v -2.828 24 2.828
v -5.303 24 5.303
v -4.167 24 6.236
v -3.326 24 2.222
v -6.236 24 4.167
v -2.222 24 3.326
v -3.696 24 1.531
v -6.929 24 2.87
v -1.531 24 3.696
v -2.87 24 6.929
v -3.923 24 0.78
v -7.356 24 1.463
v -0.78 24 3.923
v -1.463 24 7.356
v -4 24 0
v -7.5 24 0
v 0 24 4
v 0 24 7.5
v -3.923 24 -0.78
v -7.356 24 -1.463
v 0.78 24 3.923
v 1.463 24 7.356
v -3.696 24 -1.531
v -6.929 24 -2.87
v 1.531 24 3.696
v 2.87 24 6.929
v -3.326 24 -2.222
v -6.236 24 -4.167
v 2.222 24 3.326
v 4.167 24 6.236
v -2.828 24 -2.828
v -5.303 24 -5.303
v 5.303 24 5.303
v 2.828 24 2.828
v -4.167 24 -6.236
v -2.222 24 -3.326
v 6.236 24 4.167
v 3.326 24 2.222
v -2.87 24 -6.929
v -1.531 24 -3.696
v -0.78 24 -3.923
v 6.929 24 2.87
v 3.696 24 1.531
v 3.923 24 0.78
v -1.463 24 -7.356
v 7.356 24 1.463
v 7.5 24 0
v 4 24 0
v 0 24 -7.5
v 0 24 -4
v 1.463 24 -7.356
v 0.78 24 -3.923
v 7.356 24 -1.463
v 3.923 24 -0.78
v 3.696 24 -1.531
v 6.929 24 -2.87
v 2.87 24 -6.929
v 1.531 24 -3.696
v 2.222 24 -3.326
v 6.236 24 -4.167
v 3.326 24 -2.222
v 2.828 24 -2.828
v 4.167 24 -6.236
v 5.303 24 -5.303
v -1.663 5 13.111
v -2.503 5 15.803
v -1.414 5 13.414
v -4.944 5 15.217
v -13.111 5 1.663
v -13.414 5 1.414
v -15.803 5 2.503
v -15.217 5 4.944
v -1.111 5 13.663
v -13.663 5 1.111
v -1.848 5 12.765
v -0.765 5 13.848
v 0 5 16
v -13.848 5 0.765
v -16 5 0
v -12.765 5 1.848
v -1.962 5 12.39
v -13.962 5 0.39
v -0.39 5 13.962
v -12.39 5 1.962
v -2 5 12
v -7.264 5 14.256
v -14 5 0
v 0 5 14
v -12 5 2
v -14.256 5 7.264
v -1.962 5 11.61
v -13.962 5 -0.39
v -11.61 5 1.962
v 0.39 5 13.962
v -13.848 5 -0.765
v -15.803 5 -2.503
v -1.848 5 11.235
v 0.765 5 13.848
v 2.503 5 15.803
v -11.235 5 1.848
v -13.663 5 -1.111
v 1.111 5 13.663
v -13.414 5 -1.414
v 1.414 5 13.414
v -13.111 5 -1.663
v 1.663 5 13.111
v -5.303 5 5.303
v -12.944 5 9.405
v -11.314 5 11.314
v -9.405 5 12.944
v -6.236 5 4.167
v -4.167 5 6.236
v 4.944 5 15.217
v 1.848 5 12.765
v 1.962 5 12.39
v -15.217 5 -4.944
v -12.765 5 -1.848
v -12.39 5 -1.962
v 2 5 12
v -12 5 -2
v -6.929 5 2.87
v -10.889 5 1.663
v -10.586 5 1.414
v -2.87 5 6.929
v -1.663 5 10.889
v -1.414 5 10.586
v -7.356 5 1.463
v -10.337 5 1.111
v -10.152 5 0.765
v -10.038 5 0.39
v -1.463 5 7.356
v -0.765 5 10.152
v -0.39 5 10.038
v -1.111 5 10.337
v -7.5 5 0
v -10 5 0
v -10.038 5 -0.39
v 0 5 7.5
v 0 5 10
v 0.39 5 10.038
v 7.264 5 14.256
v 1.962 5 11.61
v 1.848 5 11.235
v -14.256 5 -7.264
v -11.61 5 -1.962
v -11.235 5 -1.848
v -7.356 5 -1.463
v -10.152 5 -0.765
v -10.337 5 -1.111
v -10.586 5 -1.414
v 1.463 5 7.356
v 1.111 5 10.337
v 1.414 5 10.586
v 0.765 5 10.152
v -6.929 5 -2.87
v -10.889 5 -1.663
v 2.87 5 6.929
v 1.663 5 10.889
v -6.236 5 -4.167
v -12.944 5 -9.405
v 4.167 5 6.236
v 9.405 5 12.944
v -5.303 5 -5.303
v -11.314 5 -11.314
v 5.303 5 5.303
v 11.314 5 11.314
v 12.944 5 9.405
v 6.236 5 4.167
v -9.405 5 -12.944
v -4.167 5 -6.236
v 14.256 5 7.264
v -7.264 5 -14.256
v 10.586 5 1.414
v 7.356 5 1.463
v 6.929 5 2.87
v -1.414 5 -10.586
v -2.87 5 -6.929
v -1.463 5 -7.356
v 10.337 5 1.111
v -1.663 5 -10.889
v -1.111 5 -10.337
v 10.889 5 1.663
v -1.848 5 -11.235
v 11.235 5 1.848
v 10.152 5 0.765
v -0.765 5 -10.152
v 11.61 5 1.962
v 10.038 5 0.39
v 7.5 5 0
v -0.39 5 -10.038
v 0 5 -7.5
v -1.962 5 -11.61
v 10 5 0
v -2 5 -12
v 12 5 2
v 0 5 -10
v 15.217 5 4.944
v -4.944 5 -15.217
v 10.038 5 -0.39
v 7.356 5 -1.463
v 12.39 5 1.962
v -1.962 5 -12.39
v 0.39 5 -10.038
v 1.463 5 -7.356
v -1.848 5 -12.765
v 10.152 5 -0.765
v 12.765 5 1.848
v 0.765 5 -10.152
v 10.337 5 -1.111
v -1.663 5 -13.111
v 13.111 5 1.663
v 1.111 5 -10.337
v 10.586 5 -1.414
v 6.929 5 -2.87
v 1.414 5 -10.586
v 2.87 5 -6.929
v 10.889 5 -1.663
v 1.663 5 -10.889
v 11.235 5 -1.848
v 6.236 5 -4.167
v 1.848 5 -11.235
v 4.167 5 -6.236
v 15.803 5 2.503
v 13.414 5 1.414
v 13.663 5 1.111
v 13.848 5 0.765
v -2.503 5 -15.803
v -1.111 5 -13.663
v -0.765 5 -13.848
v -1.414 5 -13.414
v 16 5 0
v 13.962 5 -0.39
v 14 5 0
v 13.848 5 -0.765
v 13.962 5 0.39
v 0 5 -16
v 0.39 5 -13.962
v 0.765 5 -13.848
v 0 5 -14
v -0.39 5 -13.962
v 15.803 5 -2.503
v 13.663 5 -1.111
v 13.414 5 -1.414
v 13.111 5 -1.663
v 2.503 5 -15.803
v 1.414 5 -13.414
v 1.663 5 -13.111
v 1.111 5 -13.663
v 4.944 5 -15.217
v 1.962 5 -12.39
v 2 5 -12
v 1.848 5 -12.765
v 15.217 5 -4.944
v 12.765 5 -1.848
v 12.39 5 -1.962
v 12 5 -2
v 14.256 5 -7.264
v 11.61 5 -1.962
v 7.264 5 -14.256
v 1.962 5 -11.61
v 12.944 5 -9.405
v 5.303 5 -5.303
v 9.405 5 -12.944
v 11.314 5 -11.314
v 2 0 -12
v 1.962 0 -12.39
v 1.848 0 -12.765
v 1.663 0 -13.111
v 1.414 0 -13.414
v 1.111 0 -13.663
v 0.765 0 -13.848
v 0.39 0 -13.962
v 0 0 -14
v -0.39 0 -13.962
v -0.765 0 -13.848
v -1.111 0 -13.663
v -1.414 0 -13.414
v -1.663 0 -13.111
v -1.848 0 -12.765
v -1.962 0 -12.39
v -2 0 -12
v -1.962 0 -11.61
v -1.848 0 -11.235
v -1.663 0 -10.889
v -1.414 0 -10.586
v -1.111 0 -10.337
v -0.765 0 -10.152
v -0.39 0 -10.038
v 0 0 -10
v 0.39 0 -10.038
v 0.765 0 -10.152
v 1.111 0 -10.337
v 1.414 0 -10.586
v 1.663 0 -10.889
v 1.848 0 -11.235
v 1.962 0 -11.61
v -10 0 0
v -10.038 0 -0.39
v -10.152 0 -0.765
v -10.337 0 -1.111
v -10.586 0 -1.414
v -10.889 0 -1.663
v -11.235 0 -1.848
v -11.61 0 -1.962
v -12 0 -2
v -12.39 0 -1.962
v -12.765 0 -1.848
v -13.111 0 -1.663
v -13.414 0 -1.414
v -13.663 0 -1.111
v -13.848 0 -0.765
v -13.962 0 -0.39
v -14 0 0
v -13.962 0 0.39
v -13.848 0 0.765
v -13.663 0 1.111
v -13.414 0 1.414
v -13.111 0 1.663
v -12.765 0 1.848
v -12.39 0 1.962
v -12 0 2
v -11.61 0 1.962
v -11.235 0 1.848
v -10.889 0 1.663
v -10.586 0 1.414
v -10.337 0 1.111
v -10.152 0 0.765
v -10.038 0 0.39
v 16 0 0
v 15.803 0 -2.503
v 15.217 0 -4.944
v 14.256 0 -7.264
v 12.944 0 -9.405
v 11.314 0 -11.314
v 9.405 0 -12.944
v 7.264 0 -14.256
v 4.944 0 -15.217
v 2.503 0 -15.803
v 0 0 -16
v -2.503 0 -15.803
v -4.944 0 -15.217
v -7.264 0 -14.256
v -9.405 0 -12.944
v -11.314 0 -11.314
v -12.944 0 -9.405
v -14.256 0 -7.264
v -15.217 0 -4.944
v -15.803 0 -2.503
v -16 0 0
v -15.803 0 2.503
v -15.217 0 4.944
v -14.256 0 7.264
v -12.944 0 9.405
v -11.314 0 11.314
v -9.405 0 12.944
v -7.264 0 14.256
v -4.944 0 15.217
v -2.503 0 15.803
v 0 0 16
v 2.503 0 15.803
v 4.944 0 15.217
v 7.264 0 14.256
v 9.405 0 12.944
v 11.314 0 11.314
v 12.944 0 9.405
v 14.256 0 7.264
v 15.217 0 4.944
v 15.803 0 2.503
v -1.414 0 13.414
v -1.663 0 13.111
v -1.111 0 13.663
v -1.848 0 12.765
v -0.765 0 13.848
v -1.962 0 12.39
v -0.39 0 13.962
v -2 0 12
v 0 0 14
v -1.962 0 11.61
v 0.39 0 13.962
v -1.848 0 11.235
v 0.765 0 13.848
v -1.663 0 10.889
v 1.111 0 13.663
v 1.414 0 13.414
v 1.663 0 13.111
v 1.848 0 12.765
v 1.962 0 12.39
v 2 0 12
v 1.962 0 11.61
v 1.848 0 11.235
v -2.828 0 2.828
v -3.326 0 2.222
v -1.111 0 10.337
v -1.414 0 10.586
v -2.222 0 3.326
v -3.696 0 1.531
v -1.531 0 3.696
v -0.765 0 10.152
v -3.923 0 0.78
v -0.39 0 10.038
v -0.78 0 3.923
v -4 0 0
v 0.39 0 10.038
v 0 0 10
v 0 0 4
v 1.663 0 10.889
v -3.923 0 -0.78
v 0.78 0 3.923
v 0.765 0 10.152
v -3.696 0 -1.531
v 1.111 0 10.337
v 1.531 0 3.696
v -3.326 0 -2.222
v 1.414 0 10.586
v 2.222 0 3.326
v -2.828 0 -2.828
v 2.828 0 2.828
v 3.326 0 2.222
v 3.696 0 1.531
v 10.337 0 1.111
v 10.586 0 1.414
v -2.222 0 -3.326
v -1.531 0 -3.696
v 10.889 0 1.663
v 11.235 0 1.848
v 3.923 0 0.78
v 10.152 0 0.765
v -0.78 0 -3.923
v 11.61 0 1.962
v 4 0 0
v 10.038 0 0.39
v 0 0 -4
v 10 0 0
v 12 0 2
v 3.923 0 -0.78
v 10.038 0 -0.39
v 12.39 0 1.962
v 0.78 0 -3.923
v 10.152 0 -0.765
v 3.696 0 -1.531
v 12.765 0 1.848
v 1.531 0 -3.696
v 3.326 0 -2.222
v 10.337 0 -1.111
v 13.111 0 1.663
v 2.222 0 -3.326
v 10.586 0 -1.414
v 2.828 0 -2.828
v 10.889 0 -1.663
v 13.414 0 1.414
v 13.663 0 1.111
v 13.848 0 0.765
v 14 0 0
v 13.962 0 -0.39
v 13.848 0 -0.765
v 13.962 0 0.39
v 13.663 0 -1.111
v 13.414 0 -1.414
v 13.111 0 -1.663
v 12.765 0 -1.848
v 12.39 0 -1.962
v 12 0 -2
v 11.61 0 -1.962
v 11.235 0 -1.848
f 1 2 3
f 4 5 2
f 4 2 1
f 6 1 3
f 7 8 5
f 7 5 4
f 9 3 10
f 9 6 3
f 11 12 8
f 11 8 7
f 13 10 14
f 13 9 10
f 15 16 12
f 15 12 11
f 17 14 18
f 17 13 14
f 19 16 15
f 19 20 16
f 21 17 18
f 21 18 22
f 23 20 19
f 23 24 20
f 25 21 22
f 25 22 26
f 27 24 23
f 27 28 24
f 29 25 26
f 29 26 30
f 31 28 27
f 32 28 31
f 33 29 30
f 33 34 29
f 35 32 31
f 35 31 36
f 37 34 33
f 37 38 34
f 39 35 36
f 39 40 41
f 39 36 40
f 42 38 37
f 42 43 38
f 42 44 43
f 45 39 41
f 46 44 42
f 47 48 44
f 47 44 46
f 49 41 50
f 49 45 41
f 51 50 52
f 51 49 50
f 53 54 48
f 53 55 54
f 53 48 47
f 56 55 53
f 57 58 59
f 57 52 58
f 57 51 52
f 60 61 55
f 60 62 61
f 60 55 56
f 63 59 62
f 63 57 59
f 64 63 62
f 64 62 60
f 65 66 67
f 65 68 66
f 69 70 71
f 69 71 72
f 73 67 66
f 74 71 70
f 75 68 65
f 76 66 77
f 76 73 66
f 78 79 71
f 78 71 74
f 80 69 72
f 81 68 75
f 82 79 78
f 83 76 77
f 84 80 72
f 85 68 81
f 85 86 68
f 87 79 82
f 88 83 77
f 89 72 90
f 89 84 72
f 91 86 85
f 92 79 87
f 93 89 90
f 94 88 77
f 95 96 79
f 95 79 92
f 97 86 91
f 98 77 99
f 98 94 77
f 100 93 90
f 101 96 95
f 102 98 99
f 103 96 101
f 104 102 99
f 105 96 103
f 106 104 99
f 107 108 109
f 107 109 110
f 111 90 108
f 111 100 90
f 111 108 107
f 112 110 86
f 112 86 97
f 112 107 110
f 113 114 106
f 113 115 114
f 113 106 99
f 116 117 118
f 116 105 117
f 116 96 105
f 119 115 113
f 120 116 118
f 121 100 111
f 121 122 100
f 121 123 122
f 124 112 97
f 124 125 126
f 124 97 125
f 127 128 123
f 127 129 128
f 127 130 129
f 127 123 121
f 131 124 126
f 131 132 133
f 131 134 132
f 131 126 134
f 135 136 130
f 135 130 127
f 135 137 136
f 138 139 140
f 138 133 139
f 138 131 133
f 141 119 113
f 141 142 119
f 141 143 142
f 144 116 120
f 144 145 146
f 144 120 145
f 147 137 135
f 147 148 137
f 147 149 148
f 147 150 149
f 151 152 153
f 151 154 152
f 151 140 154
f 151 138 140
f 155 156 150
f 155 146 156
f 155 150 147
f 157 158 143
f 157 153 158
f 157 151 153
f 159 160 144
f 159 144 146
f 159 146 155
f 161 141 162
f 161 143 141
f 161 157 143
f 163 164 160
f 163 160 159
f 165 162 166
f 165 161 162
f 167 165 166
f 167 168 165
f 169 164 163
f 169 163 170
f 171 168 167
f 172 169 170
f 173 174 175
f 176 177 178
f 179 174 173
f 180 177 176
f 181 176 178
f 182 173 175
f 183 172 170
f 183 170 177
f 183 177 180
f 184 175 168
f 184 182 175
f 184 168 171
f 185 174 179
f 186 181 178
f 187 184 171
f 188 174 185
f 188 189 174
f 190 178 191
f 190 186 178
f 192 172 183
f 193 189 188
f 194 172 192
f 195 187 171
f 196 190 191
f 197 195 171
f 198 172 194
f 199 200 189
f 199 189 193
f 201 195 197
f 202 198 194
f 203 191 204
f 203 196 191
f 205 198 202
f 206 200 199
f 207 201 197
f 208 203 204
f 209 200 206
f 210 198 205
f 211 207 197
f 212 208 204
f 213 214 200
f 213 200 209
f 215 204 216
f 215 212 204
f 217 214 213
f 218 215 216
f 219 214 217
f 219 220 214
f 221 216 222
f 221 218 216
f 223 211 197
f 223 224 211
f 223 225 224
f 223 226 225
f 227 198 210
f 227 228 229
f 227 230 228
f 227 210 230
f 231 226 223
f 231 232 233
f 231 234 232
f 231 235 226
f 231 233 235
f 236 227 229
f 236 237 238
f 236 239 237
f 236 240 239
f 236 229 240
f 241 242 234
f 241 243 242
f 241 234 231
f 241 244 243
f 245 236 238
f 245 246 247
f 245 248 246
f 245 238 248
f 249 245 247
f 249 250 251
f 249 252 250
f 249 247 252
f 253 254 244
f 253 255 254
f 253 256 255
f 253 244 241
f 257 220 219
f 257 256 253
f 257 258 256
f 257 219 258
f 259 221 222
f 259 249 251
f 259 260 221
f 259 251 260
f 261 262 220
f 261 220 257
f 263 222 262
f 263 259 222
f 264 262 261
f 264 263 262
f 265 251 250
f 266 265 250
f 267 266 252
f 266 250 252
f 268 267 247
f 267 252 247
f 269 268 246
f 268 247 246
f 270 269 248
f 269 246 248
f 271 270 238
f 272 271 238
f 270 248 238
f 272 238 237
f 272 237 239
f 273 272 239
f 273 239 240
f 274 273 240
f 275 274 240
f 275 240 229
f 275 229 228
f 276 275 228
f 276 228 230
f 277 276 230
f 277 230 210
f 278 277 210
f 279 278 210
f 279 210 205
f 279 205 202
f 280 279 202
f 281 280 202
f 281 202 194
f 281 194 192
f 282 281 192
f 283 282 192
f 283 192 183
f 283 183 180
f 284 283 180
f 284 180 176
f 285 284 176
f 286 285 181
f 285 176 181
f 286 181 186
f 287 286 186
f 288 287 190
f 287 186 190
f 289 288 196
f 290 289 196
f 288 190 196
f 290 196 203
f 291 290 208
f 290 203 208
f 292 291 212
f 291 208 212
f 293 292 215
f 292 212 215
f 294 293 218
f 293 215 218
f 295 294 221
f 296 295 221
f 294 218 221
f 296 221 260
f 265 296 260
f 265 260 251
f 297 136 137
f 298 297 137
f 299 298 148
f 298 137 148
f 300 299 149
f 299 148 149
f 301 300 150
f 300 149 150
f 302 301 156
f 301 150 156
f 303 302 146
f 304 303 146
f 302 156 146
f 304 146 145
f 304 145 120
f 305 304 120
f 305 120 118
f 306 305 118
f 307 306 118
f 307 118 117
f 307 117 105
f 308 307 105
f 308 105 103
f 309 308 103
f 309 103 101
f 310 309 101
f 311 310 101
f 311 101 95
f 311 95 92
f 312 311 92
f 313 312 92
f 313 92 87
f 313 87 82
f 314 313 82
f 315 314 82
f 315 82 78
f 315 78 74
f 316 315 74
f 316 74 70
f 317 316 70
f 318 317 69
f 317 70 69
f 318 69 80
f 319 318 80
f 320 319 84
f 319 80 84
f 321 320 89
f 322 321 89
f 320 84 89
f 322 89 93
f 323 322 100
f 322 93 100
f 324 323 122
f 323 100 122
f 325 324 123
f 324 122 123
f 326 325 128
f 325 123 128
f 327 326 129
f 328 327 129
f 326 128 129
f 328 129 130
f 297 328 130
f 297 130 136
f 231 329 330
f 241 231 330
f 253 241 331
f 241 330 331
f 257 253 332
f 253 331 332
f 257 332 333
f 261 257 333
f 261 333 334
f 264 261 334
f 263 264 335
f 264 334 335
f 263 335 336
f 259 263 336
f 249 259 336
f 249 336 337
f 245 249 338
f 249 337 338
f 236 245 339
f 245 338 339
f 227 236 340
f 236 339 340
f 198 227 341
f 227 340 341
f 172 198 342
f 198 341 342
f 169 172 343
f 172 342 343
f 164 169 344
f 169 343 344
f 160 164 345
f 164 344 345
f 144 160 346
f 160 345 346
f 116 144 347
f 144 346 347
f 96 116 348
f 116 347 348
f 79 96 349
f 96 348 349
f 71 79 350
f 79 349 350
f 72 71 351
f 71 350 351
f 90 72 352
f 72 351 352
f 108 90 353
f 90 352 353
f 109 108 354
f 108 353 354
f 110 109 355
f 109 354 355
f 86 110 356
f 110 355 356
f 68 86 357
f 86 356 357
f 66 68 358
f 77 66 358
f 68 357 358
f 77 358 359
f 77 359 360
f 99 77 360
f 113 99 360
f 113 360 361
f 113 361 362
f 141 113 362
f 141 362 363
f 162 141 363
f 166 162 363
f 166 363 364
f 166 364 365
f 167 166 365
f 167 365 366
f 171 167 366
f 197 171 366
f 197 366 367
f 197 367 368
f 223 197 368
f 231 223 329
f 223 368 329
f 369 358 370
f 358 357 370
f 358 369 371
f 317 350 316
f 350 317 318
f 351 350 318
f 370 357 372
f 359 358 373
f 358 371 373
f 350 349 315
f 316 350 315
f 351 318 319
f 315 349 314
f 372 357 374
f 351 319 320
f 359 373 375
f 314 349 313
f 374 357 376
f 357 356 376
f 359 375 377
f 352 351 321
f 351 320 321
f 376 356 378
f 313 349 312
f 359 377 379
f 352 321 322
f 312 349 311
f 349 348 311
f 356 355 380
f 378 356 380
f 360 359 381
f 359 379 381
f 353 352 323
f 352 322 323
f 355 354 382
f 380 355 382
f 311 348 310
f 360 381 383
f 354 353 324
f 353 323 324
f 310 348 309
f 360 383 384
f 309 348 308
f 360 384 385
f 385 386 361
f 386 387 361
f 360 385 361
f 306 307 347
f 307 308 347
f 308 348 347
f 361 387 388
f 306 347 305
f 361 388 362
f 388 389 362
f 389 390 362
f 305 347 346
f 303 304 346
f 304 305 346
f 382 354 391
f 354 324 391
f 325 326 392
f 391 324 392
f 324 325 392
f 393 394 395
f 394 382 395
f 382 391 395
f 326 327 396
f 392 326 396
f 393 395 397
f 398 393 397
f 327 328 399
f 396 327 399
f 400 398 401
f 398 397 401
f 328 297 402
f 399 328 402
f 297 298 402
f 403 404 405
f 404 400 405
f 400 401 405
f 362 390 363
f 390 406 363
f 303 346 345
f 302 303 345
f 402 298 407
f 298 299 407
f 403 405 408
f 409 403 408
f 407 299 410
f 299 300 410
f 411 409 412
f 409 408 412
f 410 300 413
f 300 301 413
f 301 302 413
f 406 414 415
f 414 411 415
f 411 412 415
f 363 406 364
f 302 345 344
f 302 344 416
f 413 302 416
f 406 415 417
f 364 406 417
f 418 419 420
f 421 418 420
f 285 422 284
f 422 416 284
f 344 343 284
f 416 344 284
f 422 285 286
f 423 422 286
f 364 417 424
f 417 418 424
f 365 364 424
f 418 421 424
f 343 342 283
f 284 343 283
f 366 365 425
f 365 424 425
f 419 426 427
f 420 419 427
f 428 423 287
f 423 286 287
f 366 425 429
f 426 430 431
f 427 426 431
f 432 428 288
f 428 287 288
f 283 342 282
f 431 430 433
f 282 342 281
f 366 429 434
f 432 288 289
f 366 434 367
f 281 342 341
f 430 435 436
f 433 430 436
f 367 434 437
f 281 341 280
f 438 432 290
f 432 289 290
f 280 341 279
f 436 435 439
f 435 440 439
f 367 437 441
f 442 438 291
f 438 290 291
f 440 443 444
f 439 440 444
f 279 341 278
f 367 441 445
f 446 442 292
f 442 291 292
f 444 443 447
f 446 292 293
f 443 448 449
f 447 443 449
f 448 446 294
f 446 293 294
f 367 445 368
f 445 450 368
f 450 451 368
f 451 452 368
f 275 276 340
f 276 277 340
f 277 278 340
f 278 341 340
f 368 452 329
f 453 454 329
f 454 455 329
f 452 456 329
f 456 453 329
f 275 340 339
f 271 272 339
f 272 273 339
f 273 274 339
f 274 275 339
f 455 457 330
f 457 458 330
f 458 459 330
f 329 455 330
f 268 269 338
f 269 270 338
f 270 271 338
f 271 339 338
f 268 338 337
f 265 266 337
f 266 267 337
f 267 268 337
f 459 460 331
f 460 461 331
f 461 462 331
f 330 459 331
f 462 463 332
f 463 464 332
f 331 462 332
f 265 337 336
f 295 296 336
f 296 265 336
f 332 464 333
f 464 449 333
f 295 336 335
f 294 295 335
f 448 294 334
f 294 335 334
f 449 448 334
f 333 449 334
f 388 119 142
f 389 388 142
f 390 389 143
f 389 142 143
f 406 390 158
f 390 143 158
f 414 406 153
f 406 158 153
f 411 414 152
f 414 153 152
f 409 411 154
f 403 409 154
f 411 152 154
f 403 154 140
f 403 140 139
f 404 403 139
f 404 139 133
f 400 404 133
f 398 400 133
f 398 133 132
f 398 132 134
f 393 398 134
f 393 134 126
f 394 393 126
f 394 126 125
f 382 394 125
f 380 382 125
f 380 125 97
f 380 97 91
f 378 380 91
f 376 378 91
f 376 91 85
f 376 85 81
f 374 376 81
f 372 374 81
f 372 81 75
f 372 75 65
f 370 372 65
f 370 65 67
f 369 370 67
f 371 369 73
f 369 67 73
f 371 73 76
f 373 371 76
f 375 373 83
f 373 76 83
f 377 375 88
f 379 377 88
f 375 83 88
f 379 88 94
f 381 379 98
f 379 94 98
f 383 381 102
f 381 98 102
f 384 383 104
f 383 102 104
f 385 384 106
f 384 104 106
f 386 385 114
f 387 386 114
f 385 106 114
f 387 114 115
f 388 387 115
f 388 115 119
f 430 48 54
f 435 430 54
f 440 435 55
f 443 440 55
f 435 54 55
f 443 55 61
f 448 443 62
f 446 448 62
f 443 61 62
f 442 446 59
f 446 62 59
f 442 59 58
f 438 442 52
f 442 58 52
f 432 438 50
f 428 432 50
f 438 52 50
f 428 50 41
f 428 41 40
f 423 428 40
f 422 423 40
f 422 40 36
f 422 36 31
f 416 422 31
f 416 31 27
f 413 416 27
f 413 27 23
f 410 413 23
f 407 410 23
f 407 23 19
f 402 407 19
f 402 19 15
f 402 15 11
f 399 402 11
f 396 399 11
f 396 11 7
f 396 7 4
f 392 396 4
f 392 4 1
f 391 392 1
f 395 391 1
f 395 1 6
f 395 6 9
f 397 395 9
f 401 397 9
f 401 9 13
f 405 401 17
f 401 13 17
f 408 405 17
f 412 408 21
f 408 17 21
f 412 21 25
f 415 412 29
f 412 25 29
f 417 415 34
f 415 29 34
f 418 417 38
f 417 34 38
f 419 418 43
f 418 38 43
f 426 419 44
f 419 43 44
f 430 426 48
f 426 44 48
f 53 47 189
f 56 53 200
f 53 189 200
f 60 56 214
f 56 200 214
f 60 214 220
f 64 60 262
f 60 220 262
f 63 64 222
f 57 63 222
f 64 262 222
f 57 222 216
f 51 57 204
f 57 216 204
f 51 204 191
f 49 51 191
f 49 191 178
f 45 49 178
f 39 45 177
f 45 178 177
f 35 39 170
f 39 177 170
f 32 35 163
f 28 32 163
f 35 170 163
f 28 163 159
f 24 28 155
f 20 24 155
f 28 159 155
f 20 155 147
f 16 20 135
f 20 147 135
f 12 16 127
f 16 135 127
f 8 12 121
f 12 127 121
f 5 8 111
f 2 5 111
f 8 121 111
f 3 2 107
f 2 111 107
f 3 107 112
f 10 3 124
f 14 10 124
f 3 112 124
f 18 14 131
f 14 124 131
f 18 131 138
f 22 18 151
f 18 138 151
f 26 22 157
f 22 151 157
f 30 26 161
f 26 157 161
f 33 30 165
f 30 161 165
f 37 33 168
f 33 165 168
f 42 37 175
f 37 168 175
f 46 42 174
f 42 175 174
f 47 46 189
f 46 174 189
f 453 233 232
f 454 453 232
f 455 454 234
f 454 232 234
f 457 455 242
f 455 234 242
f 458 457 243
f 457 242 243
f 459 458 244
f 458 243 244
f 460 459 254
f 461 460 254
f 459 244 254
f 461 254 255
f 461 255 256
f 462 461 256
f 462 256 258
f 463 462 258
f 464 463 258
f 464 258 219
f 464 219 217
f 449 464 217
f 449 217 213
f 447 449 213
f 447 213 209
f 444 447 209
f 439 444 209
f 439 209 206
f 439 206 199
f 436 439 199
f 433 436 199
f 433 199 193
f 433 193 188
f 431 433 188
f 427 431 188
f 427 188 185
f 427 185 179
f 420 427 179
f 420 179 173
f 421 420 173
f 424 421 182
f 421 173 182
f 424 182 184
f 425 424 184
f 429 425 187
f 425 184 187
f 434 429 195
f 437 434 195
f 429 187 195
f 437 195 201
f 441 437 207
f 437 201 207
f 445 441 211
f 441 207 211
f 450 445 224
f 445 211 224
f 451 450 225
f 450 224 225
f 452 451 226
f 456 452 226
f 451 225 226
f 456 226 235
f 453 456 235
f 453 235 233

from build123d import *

# Parameters (mm, degrees)
SKETCH2_R           = 16
BOSS_EXTRUDE1_DEPTH = 5
SKETCH3_R           = 7.5
BOSS_EXTRUDE2_DEPTH = 19
SKETCH4_R           = 4
CUT_EXTRUDE1_DEPTH  = 50
SKETCH5_R           = 2
CUT_EXTRUDE2_DEPTH  = 50


with BuildPart() as part:
    # Sketch2 → Boss-Extrude1 (new body)
    with BuildSketch(Plane(origin=(0, 0, 0), x_dir=(1, 0, 0), z_dir=(0, 1, 0))):
        Circle(SKETCH2_R)
    extrude(amount=BOSS_EXTRUDE1_DEPTH)

    # Sketch3 → Boss-Extrude2 (add)
    with BuildSketch(Plane(origin=(0, 5, 0), x_dir=(1, 0, 0), z_dir=(0, 1, 0))):
        Circle(SKETCH3_R)
    extrude(amount=BOSS_EXTRUDE2_DEPTH)

    # Sketch4 → Cut-Extrude1 (cut)
    with BuildSketch(Plane(origin=(0, 24, 0), x_dir=(1, 0, 0), z_dir=(0, 1, 0))):
        Circle(SKETCH4_R)
    extrude(amount=-CUT_EXTRUDE1_DEPTH, mode=Mode.SUBTRACT)

    # Sketch5 → Cut-Extrude2 (cut)
    with BuildSketch(Plane(origin=(0, 5, 0), x_dir=(1, 0, 0), z_dir=(0, 1, 0))):
        with Locations((0, 12)):
            Circle(SKETCH5_R)
        with Locations((0, -12)):
            Circle(SKETCH5_R)
        with Locations((-12, 0)):
            Circle(SKETCH5_R)
        with Locations((12, 0)):
            Circle(SKETCH5_R)
    extrude(amount=-CUT_EXTRUDE2_DEPTH, mode=Mode.SUBTRACT)


solid = part.part
